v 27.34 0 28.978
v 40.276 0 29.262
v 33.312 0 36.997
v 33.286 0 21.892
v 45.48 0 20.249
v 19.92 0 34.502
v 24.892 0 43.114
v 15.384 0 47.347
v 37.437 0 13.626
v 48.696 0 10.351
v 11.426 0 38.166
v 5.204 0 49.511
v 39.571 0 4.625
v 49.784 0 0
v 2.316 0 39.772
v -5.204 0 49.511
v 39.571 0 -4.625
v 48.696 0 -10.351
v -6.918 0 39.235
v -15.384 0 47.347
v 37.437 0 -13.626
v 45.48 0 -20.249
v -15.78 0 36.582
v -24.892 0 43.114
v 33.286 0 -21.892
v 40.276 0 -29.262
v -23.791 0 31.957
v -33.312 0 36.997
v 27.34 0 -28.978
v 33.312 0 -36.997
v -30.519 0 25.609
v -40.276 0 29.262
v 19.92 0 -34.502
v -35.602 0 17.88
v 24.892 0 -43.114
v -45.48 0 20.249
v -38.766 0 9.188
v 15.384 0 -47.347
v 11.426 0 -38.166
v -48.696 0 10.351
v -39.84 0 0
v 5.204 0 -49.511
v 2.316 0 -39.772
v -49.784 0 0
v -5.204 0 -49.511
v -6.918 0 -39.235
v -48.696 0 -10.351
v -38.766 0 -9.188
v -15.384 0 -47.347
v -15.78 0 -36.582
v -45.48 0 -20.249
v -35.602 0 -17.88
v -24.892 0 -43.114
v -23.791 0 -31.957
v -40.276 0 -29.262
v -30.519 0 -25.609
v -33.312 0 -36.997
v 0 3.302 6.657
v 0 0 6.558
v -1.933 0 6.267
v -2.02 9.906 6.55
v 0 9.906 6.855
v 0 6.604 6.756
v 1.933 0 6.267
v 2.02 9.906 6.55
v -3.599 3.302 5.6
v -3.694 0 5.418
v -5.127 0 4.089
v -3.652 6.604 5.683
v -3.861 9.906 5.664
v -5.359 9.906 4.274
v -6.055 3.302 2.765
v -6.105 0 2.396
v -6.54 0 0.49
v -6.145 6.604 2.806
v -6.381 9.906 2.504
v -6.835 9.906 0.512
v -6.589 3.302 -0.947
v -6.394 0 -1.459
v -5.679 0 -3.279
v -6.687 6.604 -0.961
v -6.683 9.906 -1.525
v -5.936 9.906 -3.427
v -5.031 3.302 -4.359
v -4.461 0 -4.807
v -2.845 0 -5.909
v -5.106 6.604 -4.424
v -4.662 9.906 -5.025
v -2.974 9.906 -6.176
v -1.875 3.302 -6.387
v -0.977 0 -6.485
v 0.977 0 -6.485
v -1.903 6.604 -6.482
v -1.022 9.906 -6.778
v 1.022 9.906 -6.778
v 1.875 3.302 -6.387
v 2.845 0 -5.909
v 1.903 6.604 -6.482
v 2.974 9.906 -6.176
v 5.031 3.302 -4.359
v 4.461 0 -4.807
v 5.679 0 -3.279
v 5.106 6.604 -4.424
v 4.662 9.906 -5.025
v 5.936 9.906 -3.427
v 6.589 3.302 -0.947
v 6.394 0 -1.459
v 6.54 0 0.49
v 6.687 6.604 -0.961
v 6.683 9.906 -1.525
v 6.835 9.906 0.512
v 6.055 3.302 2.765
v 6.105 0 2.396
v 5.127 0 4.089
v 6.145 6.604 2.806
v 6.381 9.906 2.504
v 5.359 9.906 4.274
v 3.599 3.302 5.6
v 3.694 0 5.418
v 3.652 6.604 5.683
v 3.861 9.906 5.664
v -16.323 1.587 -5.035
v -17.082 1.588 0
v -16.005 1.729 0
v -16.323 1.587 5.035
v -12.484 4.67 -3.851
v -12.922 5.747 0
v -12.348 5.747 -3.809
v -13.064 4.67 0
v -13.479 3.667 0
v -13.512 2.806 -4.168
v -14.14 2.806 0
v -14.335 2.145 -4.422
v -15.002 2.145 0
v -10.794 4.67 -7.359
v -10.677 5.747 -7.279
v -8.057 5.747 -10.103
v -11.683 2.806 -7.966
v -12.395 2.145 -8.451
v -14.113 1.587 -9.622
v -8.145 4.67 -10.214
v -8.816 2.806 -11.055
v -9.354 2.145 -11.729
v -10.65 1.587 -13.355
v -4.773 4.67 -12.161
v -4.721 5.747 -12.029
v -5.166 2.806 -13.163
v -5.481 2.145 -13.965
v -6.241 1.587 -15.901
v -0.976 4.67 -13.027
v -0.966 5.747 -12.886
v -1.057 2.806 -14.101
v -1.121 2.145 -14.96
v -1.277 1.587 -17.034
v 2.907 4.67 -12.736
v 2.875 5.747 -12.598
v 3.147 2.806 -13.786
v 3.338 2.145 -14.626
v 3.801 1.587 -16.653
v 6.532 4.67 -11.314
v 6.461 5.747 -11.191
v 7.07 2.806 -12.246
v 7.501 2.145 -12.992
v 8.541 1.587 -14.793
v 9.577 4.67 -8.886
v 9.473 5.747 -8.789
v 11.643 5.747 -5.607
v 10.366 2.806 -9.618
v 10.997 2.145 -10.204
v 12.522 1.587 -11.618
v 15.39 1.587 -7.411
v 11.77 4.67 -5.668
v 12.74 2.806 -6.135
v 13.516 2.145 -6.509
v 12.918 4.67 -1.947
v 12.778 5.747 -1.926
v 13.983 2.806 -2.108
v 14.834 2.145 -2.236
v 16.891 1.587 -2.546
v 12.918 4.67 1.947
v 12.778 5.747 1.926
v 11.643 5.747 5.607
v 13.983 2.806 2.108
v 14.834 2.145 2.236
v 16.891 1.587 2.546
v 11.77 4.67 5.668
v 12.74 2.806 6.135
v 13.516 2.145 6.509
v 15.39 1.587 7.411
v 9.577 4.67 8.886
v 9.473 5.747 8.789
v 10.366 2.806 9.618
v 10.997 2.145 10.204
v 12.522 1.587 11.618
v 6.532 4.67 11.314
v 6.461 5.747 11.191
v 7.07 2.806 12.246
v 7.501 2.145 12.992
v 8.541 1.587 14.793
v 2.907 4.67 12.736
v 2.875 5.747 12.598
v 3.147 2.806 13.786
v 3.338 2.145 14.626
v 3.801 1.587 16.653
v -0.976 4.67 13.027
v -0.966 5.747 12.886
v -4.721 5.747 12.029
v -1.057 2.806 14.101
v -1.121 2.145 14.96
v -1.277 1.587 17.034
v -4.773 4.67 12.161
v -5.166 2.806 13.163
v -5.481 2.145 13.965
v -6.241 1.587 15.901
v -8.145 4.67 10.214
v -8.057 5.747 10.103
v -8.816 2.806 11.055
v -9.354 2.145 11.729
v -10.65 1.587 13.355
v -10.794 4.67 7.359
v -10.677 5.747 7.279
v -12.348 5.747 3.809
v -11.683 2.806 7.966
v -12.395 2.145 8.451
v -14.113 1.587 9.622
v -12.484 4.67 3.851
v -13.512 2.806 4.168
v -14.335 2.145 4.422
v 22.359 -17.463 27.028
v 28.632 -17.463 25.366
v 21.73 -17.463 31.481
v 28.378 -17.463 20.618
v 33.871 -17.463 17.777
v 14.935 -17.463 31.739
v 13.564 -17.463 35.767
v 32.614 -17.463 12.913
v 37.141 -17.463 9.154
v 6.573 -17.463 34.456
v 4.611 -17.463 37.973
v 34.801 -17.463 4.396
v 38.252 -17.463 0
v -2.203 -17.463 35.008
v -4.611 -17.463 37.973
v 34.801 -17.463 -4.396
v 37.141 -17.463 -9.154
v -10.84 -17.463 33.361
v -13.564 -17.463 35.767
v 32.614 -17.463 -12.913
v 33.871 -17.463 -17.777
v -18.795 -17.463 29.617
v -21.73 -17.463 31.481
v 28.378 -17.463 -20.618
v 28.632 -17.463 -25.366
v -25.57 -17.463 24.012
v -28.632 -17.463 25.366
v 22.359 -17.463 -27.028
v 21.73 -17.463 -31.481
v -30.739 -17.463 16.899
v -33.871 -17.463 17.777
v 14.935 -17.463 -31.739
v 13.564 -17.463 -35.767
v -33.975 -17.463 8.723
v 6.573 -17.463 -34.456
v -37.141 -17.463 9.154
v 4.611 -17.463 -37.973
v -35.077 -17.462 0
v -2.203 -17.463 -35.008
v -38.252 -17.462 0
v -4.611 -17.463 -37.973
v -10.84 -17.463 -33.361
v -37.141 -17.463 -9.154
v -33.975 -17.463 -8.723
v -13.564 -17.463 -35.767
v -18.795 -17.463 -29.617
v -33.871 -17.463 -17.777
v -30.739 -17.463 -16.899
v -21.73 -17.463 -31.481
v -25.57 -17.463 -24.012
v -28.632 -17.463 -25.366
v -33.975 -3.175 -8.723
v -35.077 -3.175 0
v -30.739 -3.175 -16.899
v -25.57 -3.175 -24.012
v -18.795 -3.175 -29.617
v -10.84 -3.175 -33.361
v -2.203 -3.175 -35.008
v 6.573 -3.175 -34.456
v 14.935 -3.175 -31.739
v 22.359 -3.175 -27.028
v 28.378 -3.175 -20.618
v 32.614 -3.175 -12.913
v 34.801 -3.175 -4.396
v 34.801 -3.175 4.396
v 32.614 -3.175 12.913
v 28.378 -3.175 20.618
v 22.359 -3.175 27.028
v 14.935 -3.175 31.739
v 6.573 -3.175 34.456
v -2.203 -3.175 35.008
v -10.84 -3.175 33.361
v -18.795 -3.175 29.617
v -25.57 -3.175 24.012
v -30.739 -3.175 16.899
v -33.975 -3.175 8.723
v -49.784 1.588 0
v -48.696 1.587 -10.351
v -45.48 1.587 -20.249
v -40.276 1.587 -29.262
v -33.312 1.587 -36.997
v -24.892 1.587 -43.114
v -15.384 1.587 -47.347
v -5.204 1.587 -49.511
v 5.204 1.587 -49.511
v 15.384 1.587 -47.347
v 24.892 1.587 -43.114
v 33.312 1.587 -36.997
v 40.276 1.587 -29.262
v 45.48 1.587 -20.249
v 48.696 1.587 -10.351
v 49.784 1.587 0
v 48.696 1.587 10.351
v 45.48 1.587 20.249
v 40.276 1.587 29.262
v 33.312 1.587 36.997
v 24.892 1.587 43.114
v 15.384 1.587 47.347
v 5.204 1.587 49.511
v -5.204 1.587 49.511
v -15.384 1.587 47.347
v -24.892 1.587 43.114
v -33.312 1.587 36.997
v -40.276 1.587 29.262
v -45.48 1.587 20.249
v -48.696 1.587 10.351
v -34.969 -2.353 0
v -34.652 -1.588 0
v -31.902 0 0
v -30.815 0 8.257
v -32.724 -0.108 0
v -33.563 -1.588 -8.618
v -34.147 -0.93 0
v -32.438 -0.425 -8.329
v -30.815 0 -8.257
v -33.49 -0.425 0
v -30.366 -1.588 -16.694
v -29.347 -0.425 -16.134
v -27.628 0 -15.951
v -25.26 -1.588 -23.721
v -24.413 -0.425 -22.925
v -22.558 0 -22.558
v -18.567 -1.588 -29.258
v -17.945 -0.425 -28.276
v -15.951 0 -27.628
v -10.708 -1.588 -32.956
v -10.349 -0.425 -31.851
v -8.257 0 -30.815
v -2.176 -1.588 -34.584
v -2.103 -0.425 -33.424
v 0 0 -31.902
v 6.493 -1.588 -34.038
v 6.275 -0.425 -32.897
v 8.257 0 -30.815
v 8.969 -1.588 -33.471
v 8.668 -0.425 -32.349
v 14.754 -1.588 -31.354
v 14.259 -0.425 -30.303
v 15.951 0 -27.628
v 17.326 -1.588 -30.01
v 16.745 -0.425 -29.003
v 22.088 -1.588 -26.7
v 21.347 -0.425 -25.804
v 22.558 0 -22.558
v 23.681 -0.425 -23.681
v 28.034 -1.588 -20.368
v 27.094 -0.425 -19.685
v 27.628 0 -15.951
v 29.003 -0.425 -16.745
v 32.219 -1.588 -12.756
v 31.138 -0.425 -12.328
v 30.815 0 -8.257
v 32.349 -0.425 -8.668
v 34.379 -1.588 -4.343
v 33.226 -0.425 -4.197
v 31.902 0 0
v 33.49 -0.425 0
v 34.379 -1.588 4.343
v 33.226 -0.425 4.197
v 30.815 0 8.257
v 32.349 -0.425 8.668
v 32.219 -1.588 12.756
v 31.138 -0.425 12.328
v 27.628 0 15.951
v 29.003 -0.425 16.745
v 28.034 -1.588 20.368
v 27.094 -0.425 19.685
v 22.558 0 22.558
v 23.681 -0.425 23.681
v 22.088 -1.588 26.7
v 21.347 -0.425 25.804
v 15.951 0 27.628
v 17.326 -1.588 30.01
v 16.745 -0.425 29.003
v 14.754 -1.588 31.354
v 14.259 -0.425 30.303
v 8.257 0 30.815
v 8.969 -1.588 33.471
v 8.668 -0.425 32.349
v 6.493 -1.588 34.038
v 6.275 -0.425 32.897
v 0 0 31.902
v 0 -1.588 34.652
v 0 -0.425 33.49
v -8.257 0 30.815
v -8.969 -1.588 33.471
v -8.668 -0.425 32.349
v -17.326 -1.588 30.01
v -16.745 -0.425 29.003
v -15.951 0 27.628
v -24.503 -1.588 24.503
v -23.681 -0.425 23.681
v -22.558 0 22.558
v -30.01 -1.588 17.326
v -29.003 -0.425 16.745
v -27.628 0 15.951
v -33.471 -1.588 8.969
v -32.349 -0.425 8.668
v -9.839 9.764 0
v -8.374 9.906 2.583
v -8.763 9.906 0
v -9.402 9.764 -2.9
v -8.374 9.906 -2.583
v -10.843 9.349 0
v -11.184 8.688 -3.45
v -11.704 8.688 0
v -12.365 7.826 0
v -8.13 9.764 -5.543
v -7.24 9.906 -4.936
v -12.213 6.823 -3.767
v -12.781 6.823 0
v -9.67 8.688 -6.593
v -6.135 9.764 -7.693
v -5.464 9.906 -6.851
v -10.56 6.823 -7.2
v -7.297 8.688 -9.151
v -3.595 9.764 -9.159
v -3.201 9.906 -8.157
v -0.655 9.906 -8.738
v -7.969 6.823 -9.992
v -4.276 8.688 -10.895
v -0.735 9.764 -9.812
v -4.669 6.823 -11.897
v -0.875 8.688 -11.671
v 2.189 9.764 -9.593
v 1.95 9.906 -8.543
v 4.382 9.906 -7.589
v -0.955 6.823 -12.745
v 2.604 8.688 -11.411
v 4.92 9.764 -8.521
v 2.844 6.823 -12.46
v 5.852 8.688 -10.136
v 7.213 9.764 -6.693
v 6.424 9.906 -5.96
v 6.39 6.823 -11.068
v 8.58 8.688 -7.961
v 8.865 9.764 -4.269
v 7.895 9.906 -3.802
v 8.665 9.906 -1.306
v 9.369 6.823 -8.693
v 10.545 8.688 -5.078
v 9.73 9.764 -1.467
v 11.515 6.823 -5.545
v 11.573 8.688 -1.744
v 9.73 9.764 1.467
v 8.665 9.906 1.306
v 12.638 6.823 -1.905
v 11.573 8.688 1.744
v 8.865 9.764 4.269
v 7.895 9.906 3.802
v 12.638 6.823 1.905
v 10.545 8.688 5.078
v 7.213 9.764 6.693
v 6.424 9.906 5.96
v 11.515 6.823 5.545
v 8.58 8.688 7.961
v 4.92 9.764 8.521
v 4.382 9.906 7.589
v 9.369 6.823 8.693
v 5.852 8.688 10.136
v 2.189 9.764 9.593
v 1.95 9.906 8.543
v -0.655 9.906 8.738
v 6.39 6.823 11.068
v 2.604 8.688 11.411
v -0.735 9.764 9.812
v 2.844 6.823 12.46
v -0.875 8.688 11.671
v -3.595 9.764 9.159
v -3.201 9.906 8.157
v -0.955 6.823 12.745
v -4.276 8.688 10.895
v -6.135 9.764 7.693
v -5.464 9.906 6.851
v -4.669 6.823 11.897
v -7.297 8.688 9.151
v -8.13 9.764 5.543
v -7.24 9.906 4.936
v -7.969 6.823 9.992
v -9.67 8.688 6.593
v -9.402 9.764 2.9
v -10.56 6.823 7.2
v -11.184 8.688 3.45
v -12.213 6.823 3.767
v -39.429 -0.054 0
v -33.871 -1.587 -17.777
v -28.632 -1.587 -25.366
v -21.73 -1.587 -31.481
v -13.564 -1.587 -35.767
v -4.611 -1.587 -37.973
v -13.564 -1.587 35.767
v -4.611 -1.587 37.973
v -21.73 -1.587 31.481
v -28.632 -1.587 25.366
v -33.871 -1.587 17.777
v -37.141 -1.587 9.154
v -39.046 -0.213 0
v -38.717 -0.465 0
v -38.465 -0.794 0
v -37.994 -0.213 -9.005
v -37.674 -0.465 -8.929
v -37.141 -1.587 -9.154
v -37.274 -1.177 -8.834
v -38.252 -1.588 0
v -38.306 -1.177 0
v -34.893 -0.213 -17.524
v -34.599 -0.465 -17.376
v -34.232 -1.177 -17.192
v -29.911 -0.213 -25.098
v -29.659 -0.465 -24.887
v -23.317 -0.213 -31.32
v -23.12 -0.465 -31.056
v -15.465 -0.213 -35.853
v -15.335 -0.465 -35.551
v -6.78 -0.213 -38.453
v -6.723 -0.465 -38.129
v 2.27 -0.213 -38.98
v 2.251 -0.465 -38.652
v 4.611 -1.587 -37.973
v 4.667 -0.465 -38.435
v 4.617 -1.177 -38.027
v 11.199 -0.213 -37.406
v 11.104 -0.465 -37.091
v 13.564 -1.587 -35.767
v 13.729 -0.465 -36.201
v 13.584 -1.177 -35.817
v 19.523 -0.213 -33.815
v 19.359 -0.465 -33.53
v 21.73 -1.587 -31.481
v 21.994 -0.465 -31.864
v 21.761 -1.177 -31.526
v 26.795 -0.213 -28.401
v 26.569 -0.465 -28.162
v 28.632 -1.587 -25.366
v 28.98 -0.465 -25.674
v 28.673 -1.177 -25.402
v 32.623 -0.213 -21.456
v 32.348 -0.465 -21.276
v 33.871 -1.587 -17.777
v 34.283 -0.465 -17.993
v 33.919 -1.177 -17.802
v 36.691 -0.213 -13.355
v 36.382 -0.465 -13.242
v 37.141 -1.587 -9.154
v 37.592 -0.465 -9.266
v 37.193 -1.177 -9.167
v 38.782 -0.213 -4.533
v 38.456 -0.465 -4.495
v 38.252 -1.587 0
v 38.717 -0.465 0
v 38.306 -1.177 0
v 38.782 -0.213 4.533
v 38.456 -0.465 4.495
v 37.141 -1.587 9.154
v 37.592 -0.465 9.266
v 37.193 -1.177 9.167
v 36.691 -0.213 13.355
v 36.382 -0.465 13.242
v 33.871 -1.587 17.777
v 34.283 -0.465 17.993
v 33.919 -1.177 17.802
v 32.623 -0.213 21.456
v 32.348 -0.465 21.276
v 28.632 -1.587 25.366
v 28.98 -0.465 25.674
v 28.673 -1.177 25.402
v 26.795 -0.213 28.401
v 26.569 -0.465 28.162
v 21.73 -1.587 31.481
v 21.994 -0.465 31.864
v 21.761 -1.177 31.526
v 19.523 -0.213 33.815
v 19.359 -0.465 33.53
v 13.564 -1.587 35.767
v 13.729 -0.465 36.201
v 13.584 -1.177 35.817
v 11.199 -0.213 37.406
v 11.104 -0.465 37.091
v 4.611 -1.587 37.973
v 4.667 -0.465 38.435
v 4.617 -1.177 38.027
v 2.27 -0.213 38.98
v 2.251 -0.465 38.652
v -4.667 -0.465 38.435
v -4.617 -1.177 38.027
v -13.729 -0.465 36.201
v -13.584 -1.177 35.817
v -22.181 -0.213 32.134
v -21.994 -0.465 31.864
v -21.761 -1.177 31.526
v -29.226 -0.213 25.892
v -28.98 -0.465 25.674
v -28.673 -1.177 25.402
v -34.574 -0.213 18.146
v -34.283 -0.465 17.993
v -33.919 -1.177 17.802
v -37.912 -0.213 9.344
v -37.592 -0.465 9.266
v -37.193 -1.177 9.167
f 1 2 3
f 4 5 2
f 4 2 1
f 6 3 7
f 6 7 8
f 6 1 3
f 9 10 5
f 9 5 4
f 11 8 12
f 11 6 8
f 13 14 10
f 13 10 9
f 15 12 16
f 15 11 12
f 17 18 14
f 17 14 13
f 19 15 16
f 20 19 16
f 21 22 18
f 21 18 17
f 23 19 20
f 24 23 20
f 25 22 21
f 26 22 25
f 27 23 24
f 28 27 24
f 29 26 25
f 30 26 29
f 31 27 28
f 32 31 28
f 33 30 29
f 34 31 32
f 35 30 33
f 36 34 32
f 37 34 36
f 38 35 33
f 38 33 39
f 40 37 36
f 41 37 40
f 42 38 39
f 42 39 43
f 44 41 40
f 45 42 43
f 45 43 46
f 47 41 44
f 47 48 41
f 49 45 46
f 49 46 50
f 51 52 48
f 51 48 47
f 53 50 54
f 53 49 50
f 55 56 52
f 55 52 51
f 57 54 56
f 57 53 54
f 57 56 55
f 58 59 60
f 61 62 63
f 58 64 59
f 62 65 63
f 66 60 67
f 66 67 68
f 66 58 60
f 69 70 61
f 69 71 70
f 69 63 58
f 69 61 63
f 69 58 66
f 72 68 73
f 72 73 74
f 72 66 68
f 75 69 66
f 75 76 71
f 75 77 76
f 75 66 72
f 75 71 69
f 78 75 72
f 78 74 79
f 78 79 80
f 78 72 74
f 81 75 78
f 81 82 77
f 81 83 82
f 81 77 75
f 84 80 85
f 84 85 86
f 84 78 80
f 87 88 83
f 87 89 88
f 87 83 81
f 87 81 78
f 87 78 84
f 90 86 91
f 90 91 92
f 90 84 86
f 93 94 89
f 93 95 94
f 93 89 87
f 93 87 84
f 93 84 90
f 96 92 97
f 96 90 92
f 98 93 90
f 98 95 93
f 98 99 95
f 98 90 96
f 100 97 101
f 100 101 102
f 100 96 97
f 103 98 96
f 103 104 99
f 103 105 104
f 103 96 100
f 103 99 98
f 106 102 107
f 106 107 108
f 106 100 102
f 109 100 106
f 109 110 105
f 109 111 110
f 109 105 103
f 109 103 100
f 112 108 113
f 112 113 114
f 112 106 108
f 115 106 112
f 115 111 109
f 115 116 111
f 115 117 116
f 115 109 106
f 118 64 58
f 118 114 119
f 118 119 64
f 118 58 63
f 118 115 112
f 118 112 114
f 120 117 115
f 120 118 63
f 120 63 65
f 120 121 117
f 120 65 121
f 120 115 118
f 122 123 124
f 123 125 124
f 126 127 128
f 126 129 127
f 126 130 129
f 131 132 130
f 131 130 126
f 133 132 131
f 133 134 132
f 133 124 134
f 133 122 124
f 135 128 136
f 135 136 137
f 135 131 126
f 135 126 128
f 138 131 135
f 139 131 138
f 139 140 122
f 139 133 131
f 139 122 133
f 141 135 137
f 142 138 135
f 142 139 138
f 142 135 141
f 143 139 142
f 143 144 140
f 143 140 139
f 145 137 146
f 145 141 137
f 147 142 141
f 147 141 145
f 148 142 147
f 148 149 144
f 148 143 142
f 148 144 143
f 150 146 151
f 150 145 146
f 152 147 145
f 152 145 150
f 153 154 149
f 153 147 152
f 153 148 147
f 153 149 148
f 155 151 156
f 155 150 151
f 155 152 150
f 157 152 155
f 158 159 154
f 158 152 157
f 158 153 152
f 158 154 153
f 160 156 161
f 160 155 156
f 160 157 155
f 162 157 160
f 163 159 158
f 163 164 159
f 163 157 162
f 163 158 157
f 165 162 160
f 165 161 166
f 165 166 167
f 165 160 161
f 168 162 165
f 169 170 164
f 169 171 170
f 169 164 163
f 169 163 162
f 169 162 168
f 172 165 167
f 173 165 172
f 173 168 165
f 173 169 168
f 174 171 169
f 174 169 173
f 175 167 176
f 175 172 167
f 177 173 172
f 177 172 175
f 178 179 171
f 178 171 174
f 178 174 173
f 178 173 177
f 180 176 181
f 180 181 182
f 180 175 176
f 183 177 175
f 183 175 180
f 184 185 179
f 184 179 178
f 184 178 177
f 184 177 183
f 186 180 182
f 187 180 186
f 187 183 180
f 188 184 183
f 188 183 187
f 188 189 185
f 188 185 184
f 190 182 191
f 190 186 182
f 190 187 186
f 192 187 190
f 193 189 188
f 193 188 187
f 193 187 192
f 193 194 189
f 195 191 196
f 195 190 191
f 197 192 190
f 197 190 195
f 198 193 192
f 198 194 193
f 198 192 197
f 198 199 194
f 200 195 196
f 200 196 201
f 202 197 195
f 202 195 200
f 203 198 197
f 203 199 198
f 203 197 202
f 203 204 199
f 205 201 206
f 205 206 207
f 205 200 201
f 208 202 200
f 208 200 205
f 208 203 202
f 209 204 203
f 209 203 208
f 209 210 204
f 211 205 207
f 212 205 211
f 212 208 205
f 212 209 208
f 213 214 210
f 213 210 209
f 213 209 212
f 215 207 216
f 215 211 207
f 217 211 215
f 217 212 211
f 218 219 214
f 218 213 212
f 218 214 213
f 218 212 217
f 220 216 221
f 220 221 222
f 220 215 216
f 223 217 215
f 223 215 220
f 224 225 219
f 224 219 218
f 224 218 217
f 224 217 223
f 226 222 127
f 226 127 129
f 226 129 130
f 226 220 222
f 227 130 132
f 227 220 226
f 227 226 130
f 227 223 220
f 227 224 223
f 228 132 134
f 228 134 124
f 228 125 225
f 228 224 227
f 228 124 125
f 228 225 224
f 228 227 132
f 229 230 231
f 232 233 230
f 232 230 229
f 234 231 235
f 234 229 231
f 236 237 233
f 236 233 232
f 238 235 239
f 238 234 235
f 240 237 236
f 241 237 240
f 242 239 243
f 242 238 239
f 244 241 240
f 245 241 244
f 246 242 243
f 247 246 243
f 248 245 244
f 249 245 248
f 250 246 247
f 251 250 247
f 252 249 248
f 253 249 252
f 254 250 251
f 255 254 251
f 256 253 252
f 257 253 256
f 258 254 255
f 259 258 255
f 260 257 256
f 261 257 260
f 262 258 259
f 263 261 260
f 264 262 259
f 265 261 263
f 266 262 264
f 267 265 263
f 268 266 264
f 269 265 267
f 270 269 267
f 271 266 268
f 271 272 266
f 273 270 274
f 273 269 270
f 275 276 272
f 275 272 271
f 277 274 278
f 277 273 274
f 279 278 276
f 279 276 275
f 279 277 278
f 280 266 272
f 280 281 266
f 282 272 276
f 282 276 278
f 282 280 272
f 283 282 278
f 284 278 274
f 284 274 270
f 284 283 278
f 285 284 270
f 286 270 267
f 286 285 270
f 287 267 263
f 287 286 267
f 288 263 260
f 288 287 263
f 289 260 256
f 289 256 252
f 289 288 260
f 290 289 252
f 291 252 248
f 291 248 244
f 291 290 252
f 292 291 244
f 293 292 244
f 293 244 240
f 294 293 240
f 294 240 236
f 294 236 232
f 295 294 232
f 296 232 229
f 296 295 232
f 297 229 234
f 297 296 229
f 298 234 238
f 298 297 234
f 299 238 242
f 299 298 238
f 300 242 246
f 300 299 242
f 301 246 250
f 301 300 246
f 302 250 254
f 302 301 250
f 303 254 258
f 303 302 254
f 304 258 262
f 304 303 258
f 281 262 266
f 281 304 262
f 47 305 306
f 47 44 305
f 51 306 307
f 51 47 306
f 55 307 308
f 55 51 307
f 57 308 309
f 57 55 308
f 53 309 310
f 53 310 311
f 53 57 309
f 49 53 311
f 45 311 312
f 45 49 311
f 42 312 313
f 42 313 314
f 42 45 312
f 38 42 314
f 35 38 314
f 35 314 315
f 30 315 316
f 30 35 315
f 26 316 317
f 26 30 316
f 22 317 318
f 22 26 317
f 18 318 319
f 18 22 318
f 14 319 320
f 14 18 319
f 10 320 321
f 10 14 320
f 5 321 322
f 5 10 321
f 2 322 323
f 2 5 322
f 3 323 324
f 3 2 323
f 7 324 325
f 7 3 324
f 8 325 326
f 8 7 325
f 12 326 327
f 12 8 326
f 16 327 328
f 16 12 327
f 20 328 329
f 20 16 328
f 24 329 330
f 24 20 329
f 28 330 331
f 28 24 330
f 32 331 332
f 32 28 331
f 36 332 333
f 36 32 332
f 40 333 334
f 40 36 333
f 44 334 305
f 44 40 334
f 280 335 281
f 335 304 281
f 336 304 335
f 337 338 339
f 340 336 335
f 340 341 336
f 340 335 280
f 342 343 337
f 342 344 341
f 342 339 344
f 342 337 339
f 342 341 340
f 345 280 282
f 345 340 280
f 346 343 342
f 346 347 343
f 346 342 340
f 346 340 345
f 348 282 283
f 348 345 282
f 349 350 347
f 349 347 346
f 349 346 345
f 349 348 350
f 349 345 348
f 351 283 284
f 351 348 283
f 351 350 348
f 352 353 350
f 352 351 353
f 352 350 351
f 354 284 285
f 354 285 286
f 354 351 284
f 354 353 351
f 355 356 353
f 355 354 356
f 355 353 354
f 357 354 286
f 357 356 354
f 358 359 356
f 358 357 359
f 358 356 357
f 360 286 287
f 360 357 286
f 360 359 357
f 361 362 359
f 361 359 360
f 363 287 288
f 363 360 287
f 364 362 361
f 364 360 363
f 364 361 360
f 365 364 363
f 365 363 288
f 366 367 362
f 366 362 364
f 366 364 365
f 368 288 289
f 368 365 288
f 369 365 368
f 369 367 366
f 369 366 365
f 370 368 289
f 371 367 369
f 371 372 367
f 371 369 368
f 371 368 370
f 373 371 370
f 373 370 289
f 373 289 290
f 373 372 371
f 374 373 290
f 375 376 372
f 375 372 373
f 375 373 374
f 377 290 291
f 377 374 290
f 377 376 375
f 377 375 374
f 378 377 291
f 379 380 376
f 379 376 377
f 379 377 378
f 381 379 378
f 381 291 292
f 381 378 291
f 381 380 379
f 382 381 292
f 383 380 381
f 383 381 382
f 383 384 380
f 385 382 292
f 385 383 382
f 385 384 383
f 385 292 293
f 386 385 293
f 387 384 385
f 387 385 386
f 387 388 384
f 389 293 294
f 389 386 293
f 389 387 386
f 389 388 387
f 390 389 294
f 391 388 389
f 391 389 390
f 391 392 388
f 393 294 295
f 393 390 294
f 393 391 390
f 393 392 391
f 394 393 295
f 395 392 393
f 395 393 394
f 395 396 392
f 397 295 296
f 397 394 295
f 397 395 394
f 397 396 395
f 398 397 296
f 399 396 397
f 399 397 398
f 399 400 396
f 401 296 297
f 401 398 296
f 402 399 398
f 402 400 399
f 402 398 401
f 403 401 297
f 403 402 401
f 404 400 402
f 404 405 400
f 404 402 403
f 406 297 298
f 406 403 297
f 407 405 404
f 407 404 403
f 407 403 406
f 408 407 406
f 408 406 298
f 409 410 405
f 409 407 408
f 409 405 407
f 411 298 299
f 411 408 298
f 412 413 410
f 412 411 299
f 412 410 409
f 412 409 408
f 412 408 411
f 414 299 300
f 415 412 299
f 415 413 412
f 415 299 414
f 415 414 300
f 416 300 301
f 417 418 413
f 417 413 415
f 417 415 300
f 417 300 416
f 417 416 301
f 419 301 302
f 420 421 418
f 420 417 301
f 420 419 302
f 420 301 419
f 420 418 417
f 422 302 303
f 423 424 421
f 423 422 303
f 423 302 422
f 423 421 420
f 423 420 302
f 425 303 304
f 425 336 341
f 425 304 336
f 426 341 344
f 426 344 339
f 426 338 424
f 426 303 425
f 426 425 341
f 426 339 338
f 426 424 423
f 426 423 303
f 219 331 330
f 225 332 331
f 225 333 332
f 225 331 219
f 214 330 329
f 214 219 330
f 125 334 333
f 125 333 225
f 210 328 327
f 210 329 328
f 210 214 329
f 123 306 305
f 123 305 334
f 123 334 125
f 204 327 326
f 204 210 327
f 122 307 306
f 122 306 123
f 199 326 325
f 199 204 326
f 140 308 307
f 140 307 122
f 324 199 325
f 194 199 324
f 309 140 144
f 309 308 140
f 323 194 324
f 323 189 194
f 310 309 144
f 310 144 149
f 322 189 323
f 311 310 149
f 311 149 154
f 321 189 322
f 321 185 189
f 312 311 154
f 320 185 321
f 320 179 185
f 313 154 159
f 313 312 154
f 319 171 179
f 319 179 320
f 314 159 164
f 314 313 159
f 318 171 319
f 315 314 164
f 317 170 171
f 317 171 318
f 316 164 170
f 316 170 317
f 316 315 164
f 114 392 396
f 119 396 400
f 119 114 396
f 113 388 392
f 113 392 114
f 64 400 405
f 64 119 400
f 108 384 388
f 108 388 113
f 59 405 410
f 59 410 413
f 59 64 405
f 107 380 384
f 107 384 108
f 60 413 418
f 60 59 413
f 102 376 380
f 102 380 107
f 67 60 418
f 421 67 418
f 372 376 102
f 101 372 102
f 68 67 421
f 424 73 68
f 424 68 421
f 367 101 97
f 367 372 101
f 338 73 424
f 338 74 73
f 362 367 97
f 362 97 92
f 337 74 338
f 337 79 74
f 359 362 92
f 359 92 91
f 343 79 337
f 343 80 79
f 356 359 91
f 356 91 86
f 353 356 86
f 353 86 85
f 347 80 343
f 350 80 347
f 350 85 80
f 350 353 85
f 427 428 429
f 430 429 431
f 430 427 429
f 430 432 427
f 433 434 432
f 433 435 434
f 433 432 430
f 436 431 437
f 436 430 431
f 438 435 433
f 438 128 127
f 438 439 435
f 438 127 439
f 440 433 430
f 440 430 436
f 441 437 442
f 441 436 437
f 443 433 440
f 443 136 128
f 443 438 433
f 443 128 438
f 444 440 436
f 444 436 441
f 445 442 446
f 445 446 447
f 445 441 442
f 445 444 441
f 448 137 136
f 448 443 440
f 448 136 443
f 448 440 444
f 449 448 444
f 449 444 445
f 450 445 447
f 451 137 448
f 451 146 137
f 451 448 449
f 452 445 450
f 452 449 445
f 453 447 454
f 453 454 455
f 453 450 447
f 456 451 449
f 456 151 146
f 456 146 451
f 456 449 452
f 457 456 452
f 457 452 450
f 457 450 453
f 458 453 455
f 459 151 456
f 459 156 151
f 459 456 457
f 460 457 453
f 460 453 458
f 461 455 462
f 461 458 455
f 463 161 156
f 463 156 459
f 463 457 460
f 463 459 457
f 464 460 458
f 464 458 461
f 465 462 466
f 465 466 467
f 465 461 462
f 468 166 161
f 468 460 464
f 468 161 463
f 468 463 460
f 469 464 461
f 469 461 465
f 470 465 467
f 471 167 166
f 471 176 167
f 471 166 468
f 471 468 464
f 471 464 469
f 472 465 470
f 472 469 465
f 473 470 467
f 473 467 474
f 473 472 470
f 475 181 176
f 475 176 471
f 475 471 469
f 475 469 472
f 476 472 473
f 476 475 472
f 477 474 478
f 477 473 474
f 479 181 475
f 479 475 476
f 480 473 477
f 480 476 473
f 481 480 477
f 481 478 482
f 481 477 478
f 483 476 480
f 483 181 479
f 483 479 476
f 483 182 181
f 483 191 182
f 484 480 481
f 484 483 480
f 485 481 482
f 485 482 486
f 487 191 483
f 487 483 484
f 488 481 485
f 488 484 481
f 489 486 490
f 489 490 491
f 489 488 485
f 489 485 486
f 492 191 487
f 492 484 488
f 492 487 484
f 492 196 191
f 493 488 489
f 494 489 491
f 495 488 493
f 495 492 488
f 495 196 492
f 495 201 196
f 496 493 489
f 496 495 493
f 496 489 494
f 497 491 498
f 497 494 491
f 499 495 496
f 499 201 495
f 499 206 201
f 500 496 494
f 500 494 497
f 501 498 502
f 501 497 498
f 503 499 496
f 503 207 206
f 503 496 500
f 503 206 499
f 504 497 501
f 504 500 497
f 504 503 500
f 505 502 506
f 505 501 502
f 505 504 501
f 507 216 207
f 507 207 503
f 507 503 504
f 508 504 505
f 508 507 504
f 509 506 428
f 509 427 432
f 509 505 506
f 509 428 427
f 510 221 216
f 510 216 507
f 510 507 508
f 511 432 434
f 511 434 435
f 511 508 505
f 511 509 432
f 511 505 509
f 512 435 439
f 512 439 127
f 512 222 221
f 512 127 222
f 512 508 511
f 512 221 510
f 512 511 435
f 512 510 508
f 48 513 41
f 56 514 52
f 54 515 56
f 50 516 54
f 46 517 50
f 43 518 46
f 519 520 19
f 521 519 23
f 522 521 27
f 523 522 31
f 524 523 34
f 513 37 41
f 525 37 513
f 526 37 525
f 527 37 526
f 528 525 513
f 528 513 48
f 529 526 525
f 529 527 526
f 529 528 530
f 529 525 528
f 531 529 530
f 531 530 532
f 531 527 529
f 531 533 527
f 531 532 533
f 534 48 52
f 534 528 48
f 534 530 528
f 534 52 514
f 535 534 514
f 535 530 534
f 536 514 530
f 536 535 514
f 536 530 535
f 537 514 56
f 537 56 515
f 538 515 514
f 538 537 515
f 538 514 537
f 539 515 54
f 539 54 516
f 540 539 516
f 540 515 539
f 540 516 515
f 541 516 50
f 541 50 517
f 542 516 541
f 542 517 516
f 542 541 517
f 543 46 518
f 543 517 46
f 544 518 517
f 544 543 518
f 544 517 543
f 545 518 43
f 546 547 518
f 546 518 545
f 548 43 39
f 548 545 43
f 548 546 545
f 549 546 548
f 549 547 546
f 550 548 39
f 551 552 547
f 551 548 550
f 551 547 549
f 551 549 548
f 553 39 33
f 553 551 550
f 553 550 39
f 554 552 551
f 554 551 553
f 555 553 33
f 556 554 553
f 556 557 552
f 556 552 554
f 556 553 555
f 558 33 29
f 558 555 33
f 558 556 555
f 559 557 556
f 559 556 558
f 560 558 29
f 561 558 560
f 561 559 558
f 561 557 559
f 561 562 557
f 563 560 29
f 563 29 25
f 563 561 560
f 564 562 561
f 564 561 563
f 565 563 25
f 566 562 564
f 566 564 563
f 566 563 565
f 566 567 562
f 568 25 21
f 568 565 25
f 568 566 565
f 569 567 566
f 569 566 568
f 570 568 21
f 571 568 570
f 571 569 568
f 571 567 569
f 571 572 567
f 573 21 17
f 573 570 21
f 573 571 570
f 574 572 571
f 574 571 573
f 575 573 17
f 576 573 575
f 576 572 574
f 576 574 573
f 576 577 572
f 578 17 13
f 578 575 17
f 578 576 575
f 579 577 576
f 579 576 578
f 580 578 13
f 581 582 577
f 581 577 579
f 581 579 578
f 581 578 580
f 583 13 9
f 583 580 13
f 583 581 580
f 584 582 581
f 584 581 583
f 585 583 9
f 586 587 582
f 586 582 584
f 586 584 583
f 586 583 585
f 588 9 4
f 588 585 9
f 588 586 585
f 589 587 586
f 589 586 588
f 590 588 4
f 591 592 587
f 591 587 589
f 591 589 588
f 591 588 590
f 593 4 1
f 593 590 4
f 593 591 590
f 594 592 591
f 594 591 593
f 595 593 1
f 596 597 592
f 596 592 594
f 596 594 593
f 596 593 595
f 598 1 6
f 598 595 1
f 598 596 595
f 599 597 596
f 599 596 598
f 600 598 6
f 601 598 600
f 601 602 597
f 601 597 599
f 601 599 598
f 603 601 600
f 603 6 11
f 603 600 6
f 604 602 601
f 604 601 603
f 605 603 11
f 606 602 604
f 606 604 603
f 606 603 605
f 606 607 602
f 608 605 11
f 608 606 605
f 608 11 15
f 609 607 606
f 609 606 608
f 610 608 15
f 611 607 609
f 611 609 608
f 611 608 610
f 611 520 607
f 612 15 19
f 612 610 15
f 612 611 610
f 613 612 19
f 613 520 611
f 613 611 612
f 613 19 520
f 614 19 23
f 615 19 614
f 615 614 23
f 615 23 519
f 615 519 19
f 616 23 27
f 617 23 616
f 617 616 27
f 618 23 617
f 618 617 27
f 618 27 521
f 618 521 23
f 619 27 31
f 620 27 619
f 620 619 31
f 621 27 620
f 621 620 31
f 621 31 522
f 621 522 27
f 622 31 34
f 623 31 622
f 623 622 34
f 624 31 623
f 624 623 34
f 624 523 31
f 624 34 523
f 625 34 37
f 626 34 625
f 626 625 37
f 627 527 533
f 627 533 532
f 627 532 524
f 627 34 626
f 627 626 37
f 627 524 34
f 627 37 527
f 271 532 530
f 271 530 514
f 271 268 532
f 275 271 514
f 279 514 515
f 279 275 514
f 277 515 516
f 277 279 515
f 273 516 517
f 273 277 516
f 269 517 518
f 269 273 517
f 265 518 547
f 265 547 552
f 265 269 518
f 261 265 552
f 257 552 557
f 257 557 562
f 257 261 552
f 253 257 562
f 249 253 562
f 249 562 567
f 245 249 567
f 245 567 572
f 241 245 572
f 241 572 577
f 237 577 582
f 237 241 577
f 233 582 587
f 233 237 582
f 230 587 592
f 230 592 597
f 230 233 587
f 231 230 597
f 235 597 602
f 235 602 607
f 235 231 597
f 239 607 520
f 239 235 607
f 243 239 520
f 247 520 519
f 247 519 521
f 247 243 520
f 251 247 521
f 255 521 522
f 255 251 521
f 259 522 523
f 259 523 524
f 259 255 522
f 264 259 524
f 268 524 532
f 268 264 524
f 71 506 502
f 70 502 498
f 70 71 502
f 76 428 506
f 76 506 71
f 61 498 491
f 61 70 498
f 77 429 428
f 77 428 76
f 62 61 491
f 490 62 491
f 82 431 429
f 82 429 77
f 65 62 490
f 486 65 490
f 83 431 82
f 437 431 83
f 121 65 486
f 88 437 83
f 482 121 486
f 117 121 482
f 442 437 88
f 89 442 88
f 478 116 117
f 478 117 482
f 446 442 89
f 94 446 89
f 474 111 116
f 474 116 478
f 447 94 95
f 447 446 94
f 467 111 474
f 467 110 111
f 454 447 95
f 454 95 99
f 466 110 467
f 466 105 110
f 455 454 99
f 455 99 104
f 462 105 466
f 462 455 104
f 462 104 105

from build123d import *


with BuildPart() as part:
    # Sketch1 → Revolve1 (revolve)
    with BuildSketch(Plane.XY):
        with BuildLine():
            Line((-49.784, 0), (-39.839899999, 0))
            ThreePointArc((-39.839899999, 0), (-38.717367984, -0.464967985), (-38.252399999, -1.5875))
            Line((-38.252399999, -1.5875), (-38.2524, -17.4625))
            Line((-38.2524, -17.4625), (-35.0774, -17.4625))
            Line((-35.0774, -17.4625), (-35.0774, -3.175))
            ThreePointArc((-35.0774, -3.175), (-34.14746403, -0.92993597), (-31.9024, 0))
            Line((-31.9024, 0), (-5.588, 0))
            Line((-5.588, 0), (-5.588, 9.906))
            Line((-5.588, 9.906), (-8.763, 9.906))
            ThreePointArc((-8.763, 9.906), (-11.70403388, 8.68778388), (-12.92225, 5.74675))
            ThreePointArc((-12.92225, 5.74675), (-14.14046612, 2.80571612), (-17.0815, 1.5875))
            Line((-17.0815, 1.5875), (-49.784, 1.5875))
            Line((-49.784, 1.5875), (-49.784, 0))
        make_face()
    revolve(axis=Axis((0, 55, 0), (0, -1, 0)))

    # Sketch5 → 1/4 NPT Tapped Hole1 (revolve, cut)
    with BuildSketch(Plane(origin=(0, 9.906, 0), x_dir=(0, 0, 1), z_dir=(1, 0, 0))):
        Polygon((0, 0), (0, 27.3685), (5.5626, 27.3685), (5.5626, 9.906), (6.557984794, 9.906), (6.8545837, 0), align=None)
    revolve(axis=Axis((0, 16.256, 0), (0, -1, 0)), mode=Mode.SUBTRACT)


solid = part.part
